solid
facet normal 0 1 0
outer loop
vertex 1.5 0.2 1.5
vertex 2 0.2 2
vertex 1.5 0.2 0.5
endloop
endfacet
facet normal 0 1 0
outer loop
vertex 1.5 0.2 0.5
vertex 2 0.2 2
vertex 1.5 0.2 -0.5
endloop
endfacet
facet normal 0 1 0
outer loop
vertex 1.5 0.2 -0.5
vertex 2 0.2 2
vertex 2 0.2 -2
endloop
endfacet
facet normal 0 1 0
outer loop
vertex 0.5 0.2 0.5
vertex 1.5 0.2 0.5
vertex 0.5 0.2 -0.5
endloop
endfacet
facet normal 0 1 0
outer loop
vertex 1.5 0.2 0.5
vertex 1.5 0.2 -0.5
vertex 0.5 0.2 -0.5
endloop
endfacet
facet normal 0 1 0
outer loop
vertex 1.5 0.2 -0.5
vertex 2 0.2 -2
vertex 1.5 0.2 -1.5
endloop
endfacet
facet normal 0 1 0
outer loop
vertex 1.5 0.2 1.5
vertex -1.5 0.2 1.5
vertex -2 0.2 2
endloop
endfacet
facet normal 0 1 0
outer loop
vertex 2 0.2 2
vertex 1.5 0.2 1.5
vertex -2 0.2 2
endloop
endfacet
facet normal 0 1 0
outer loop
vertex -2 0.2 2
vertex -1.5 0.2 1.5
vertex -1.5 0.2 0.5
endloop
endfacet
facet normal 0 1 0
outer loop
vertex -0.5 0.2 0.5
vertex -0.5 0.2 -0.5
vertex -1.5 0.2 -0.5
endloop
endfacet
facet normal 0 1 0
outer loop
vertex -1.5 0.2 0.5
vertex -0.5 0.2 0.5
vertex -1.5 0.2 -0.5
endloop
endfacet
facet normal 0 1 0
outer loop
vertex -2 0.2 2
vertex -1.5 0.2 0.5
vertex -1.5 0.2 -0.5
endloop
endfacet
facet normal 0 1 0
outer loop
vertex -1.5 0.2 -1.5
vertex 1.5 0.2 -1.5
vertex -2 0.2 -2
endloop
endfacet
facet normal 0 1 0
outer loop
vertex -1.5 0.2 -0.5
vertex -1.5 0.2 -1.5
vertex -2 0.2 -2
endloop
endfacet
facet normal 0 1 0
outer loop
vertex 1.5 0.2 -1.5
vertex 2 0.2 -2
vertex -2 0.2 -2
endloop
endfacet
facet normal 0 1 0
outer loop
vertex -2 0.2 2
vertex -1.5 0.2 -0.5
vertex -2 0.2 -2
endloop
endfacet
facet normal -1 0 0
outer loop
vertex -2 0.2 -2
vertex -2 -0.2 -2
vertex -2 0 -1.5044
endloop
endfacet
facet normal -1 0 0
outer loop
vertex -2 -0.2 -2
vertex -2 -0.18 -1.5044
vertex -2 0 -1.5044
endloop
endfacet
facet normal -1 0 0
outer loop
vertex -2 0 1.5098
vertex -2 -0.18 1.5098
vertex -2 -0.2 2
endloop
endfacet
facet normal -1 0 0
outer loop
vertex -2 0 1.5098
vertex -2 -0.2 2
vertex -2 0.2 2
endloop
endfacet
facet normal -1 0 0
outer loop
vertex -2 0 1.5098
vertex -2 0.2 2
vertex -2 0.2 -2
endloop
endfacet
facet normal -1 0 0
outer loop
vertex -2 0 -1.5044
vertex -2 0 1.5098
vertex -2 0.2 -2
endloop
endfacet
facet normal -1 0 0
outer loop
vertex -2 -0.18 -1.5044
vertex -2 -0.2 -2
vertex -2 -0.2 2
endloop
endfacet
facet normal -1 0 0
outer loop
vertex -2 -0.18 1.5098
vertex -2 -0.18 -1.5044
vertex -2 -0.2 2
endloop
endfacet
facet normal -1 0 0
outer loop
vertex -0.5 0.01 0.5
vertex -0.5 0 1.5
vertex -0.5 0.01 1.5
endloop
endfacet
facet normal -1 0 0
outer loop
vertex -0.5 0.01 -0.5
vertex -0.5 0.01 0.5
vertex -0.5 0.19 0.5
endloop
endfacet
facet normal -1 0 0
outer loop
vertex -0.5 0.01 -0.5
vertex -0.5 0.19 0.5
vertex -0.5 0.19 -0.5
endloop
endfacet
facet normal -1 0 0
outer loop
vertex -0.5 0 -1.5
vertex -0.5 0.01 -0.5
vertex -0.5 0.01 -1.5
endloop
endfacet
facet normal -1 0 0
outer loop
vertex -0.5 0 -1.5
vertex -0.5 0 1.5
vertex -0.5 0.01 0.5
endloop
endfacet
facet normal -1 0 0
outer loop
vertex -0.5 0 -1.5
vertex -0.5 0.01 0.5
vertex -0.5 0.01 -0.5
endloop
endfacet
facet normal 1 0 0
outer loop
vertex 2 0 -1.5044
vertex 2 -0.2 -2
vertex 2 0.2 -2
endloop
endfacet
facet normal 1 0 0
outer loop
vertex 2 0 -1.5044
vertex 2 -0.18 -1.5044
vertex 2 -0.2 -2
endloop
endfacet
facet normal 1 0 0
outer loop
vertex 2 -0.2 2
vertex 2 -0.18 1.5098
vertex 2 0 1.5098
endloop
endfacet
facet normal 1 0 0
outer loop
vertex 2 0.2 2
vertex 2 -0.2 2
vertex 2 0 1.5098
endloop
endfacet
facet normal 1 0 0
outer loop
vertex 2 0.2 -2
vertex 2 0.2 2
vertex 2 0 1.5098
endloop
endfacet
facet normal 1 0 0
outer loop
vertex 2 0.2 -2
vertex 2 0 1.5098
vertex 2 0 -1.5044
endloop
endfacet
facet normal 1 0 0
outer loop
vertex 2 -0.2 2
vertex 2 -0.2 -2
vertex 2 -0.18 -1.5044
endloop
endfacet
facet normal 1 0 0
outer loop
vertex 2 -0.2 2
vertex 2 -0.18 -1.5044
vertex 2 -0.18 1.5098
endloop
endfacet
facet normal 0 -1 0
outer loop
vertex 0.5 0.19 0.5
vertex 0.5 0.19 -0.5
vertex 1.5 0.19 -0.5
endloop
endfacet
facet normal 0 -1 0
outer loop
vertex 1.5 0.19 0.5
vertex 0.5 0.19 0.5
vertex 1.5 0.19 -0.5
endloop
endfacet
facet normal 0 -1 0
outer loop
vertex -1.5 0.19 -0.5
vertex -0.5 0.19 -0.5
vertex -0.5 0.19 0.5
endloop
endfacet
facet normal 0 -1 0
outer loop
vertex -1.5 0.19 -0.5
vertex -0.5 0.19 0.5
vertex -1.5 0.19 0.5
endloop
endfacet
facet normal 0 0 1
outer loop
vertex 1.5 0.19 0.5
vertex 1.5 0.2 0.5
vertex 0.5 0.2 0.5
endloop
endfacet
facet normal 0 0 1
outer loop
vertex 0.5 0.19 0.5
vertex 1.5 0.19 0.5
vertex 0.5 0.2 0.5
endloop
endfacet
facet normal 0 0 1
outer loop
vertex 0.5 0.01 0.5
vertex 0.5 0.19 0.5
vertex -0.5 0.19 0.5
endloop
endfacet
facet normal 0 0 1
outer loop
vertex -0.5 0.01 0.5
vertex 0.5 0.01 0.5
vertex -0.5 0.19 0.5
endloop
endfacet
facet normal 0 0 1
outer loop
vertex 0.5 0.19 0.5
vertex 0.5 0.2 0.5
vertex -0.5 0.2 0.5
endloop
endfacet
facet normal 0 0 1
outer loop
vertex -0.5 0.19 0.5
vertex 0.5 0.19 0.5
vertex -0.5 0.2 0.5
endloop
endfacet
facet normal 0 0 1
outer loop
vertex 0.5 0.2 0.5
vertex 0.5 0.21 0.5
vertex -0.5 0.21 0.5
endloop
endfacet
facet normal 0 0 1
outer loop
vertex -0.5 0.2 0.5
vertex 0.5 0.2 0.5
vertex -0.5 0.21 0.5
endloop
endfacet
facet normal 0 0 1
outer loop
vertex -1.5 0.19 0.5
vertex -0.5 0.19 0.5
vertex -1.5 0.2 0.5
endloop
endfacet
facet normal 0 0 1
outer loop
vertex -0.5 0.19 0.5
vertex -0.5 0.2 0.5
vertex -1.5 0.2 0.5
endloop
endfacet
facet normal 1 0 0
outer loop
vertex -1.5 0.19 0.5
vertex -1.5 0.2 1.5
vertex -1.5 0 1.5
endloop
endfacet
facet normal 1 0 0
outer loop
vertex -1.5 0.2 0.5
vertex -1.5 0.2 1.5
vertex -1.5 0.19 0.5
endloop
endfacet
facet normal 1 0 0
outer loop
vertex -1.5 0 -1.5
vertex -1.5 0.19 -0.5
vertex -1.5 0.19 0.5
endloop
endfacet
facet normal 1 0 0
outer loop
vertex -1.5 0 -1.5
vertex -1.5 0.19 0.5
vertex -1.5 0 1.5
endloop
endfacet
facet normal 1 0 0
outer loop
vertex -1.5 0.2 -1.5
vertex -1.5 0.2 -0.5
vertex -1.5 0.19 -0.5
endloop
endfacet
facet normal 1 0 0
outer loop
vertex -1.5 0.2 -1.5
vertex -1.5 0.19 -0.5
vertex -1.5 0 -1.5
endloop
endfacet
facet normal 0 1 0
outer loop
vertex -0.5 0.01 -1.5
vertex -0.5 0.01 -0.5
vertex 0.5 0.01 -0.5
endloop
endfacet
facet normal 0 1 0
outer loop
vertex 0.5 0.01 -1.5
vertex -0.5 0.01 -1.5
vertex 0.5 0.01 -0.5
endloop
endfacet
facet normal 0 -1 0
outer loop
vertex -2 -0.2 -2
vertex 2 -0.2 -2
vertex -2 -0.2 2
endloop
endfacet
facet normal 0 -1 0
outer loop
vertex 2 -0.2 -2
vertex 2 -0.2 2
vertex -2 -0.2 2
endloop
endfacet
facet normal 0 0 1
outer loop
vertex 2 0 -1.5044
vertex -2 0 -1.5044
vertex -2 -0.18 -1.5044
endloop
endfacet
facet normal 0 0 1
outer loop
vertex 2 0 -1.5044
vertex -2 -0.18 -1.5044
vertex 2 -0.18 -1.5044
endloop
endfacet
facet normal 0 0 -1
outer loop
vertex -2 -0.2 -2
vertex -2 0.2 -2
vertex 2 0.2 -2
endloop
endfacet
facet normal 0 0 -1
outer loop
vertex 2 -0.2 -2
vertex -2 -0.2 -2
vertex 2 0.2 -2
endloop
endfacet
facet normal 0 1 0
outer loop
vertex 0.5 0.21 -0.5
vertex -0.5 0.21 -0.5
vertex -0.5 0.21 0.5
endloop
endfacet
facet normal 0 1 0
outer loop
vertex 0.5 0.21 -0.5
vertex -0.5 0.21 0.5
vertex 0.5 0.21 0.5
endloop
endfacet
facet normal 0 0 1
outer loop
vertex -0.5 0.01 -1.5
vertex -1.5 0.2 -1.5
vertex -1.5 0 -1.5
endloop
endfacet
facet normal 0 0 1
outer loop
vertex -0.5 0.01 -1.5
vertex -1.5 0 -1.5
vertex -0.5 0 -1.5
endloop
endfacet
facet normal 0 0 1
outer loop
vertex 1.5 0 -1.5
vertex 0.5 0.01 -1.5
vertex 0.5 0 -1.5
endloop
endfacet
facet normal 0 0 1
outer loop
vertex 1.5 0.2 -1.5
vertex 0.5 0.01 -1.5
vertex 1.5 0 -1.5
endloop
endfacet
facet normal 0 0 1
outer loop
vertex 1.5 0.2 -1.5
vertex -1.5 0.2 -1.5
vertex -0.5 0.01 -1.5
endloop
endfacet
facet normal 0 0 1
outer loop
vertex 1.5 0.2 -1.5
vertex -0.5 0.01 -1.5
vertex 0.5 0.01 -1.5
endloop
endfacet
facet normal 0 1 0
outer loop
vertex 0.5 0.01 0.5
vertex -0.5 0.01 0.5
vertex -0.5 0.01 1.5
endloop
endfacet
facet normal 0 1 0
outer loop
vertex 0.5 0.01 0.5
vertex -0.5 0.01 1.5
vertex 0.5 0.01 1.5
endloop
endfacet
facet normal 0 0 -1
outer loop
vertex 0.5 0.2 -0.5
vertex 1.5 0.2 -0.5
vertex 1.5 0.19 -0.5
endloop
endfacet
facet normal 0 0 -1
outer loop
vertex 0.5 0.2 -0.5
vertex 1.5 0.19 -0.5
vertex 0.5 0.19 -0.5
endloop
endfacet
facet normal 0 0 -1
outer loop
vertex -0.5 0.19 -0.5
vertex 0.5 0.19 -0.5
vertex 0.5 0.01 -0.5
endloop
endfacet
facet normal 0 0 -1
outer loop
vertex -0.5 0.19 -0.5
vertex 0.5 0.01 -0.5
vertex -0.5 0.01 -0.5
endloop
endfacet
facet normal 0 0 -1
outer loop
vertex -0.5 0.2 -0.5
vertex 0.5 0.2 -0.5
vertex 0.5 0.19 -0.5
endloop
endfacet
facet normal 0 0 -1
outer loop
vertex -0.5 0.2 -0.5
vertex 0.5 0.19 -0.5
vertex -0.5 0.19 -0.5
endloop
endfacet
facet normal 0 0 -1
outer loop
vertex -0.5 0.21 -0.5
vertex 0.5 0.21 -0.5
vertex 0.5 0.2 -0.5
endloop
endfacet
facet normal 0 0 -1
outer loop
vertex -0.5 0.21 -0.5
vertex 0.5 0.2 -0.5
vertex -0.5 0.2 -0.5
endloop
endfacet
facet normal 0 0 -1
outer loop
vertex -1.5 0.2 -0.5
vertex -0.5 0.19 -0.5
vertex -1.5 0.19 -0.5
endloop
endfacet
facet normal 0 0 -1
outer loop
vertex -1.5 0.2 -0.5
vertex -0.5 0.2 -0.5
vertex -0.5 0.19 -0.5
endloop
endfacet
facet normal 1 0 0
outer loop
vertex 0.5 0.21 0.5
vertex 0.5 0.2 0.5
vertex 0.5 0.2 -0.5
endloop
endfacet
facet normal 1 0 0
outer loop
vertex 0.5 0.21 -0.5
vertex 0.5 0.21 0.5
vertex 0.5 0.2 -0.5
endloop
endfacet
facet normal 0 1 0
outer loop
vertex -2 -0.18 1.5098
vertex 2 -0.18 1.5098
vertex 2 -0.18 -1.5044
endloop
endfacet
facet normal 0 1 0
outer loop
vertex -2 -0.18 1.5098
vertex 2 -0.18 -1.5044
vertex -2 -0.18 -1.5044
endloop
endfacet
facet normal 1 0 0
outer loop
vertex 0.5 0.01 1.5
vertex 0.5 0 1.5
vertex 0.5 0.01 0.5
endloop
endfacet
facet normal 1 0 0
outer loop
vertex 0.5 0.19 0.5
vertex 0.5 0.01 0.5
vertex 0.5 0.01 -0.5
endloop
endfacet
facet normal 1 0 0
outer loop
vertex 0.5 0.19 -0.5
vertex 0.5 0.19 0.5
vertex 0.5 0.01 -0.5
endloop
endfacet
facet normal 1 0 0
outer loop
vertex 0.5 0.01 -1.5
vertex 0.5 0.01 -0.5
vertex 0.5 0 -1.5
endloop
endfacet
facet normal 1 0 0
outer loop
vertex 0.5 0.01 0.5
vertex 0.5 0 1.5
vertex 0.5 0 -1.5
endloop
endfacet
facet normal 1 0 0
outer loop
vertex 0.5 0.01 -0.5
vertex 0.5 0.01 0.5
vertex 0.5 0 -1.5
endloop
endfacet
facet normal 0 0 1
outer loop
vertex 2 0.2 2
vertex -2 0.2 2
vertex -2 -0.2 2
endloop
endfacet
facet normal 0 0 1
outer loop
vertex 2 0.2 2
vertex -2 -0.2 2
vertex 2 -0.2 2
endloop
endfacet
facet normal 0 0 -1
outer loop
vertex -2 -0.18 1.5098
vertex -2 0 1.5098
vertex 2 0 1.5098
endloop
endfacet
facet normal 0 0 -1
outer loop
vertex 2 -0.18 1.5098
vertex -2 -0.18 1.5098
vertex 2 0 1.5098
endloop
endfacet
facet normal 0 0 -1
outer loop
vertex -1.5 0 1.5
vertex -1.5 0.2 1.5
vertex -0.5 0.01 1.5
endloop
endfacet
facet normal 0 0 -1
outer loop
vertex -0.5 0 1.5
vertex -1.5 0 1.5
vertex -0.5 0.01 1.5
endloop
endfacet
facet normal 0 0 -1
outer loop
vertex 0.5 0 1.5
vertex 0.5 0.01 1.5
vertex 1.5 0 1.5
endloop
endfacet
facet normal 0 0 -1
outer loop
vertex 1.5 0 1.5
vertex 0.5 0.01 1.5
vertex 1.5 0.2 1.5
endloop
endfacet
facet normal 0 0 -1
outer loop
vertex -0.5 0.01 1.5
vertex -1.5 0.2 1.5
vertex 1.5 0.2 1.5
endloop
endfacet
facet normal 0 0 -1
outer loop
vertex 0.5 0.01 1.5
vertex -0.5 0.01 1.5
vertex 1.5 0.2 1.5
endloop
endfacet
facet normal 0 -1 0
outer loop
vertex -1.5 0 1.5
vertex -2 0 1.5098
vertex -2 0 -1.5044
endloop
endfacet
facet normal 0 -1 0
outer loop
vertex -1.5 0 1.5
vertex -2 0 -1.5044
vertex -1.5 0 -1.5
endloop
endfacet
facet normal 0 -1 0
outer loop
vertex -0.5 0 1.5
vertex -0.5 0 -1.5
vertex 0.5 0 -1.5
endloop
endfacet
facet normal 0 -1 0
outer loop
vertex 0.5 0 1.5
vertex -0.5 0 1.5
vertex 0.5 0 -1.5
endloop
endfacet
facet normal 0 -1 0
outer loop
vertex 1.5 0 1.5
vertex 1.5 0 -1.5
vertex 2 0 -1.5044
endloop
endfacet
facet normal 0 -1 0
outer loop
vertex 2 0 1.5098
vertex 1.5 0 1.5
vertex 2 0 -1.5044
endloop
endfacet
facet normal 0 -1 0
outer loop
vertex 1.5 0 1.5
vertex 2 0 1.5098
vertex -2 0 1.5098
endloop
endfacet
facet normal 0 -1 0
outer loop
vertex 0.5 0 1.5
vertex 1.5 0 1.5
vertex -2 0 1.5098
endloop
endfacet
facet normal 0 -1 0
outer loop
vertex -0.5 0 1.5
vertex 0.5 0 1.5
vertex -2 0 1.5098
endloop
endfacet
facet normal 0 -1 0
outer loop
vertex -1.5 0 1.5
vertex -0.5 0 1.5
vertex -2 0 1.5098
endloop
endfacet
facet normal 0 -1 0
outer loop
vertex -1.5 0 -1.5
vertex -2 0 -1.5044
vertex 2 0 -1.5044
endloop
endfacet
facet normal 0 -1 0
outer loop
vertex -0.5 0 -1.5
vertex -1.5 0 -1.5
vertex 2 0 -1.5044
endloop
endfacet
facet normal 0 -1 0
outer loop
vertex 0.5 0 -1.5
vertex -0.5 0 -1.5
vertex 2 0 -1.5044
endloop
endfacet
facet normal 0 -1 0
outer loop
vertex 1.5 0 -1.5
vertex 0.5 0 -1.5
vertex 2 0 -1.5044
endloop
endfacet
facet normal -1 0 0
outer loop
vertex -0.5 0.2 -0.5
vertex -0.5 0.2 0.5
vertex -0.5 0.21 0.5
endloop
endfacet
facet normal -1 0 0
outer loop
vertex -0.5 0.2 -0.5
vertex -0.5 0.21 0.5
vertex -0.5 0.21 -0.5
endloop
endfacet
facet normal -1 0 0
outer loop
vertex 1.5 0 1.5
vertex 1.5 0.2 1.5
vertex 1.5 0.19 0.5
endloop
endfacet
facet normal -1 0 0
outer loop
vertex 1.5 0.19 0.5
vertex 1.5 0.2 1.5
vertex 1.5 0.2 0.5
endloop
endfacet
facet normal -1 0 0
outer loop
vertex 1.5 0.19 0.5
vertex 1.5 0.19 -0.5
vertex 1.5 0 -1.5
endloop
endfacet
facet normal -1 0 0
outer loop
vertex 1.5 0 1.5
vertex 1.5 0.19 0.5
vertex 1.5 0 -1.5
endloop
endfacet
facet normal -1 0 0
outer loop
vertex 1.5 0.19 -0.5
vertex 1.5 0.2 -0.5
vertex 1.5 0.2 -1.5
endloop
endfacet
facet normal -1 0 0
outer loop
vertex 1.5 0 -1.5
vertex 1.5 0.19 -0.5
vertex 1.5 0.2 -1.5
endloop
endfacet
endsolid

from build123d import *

# Parameters (mm, degrees)
SKETCH1_W           = 1
SKETCH1_H           = 1
BOSS_EXTRUDE1_DEPTH = 0.2
SKETCH2_W           = 4
SKETCH2_H           = 4
SKETCH2_W_2         = 3
SKETCH2_H_2         = 3
BOSS_EXTRUDE2_DEPTH = 0.2
SKETCH3_W           = 1
SKETCH3_H           = 1
BOSS_EXTRUDE3_DEPTH = 0.01
SKETCH4_W           = 1
SKETCH4_H           = 1
BOSS_EXTRUDE4_DEPTH = 0.01
SKETCH6_W           = 1
SKETCH6_H           = 1
BOSS_EXTRUDE5_DEPTH = 0.01
SKETCH8_W           = 4
SKETCH8_H           = 0.490188984
SKETCH8_H_2         = 0.495614814
BOSS_EXTRUDE6_DEPTH = 0.2
SKETCH9_W           = 4
SKETCH9_H           = 0.02
BOSS_EXTRUDE7_DEPTH = 3.014196203


with BuildPart() as part:
    # Sketch1 → Boss-Extrude1 (new body)
    with BuildSketch(Plane(origin=(0, 0, 0), x_dir=(1, 0, 0), z_dir=(0, 1, 0))):
        Rectangle(SKETCH1_W, SKETCH1_H)
    extrude(amount=BOSS_EXTRUDE1_DEPTH)



with BuildPart() as body_2:
    # Sketch2 → Boss-Extrude2 (new body)
    with BuildSketch(Plane(origin=(0, 0.2, 0), x_dir=(1, 0, 0), z_dir=(0, 1, 0))):
        Rectangle(SKETCH2_W, SKETCH2_H)
        Rectangle(SKETCH2_W_2, SKETCH2_H_2, mode=Mode.SUBTRACT)
    extrude(amount=-BOSS_EXTRUDE2_DEPTH)


with BuildPart() as part_1:
    add(part.part)

    add(body_2.part)  # Boss-Extrude3 merges body 2
    # Sketch3 → Boss-Extrude3 (add)
    with BuildSketch(Plane.XZ):
        with Locations((0, -1)):
            Rectangle(SKETCH3_W, SKETCH3_H)
    boss_extrude3 = extrude(amount=-BOSS_EXTRUDE3_DEPTH)

    # Mirror1: Boss-Extrude3 across plane
    add(boss_extrude3.mirror(Plane.XY))

    # Sketch4 → Boss-Extrude4 (add)
    with BuildSketch(Plane(origin=(0, 0.2, 0), x_dir=(1, 0, 0), z_dir=(0, 1, 0))):
        with Locations((1, 0)):
            Rectangle(SKETCH4_W, SKETCH4_H)
    boss_extrude4 = extrude(amount=-BOSS_EXTRUDE4_DEPTH)

    # Mirror2: Boss-Extrude4 across plane
    add(boss_extrude4.mirror(Plane(origin=(0, 0, 0), x_dir=(0, 0, 1), z_dir=(1, 0, 0))))

    # Sketch6 → Boss-Extrude5 (add)
    with BuildSketch(Plane(origin=(0, 0.2, 0), x_dir=(1, 0, 0), z_dir=(0, 1, 0))):
        Rectangle(SKETCH6_W, SKETCH6_H)
    extrude(amount=BOSS_EXTRUDE5_DEPTH)

    # Sketch8 → Boss-Extrude6 (add)
    with BuildSketch(Plane.XZ):
        with Locations((0, 1.754905508)):
            Rectangle(SKETCH8_W, SKETCH8_H)
        with Locations((0, -1.752192593)):
            Rectangle(SKETCH8_W, SKETCH8_H_2)
    extrude(amount=BOSS_EXTRUDE6_DEPTH)

    # Sketch9 → Boss-Extrude7 (add)
    with BuildSketch(Plane(origin=(0, 0, 1.509811016), x_dir=(-1, 0, 0), z_dir=(0, 0, -1))):
        with Locations((0, -0.19)):
            Rectangle(SKETCH9_W, SKETCH9_H)
    extrude(amount=BOSS_EXTRUDE7_DEPTH)


solid = part_1.part
